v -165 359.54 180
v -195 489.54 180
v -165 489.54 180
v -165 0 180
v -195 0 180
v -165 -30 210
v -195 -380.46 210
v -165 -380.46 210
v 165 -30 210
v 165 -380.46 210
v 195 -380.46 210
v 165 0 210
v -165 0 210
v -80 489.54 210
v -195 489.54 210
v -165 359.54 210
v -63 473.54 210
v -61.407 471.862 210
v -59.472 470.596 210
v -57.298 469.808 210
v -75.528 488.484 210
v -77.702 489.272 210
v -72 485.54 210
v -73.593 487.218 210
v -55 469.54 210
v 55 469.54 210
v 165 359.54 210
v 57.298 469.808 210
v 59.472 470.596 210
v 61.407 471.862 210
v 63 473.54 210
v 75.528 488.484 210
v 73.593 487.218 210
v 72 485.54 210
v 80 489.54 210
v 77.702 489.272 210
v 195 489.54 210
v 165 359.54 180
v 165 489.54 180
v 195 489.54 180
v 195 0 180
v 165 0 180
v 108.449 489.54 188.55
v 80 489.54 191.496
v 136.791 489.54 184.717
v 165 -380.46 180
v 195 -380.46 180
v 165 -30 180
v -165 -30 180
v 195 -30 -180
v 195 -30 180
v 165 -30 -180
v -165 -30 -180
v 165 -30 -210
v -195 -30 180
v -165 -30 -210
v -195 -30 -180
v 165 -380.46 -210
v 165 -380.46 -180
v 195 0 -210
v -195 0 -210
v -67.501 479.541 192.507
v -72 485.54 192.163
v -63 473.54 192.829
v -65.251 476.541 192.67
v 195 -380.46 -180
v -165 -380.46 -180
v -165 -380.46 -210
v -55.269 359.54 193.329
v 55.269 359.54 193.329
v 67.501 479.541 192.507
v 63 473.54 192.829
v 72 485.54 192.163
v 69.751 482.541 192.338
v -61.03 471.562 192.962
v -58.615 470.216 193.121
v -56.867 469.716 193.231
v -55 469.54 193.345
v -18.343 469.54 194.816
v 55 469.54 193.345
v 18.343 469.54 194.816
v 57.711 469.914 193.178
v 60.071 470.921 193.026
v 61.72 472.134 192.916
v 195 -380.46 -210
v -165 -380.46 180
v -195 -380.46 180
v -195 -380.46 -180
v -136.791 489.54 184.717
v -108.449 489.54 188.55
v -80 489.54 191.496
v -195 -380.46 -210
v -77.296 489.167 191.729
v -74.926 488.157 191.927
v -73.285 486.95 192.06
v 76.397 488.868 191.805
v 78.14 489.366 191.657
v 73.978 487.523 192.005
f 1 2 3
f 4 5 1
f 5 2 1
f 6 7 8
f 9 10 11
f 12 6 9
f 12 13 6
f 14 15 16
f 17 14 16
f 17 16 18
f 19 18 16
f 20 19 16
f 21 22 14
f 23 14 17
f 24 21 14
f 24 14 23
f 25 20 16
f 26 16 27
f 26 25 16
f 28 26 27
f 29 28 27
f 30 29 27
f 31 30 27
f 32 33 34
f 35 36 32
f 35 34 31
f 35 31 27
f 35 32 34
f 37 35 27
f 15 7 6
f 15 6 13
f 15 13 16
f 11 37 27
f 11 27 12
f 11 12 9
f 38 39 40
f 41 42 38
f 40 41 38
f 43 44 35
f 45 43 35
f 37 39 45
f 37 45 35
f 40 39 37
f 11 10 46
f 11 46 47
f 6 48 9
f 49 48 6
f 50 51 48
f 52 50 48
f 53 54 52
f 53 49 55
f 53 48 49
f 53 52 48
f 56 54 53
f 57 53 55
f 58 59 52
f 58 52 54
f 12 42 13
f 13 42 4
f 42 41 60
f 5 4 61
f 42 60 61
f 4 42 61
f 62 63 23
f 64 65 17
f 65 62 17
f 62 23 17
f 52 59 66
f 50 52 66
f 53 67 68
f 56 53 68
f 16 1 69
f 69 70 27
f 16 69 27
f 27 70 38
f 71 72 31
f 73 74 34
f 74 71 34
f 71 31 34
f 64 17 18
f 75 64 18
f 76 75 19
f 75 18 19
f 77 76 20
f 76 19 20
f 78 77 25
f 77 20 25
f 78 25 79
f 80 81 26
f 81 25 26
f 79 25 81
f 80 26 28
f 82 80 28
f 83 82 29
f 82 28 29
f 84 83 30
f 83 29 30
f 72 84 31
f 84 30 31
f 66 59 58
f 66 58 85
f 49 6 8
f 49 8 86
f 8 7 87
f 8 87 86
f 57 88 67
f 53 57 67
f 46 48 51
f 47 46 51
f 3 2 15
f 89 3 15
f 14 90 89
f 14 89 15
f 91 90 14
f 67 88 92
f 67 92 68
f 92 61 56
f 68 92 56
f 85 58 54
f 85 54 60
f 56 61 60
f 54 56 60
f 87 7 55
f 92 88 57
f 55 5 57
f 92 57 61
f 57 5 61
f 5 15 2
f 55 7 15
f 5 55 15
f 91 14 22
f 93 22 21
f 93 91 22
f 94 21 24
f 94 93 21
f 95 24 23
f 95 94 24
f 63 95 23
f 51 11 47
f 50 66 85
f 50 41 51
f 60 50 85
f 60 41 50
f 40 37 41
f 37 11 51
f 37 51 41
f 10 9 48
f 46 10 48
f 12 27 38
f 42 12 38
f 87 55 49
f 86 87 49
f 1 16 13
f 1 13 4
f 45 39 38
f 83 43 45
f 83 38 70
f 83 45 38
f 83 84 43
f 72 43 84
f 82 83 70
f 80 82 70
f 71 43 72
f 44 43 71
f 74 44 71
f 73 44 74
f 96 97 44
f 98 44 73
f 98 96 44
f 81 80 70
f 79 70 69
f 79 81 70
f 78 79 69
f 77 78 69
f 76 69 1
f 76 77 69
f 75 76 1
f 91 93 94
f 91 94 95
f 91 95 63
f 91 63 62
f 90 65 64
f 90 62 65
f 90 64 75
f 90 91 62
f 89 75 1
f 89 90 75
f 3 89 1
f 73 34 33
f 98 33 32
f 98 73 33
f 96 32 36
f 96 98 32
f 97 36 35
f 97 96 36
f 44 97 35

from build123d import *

# Parameters (mm, degrees)
BOSS_EXTRUDE1_DEPTH        = 489.54
BOSS_EXTRUDE1_DEPTH_BACK   = 430
SKETCH2_W                  = 30
SKETCH2_H                  = 30
BOSS_EXTRUDE1_2_DEPTH      = 489.54
BOSS_EXTRUDE1_2_DEPTH_BACK = 430
SKETCH3_W                  = 30
SKETCH3_H                  = 30
BOSS_EXTRUDE2_DEPTH        = 430
BOSS_EXTRUDE2_2_DEPTH      = 430
BOSS_EXTRUDE3_DEPTH        = 30
BOSS_EXTRUDE4_DEPTH        = 130
CUT_EXTRUDE2_REACH         = 675.85
CUT_EXTRUDE2_END_RADIUS    = 915
FILLET1_R                  = 10
SKETCH8_W                  = 390
SKETCH8_H                  = 49.54
CUT_EXTRUDE3_DEPTH         = 674.850437188


with BuildPart() as part:
    # Sketch2 → Boss-Extrude1 (new, two sides: drawn at the far end of the back side and taken through both)
    with BuildSketch(Plane(origin=(0, 0, 0), x_dir=(1, 0, 0), z_dir=(0, 1, 0)).offset(-BOSS_EXTRUDE1_DEPTH_BACK)):
        with Locations((-180, -195)):
            Rectangle(SKETCH2_W, SKETCH2_H)
    extrude(amount=BOSS_EXTRUDE1_DEPTH + BOSS_EXTRUDE1_DEPTH_BACK)



with BuildPart() as body_2:
    # Sketch2 → Boss-Extrude1 2 (new, two sides: drawn at the far end of the back side and taken through both)
    with BuildSketch(Plane(origin=(0, 0, 0), x_dir=(1, 0, 0), z_dir=(0, 1, 0)).offset(-BOSS_EXTRUDE1_2_DEPTH_BACK)):
        with Locations((180, -195)):
            Rectangle(SKETCH2_W, SKETCH2_H)
    extrude(amount=BOSS_EXTRUDE1_2_DEPTH + BOSS_EXTRUDE1_2_DEPTH_BACK)


with BuildPart() as body_3:
    # Sketch3 → Boss-Extrude2 (new body)
    with BuildSketch(Plane(origin=(0, 0, 0), x_dir=(1, 0, 0), z_dir=(0, 1, 0))):
        with Locations((-180, 195)):
            Rectangle(SKETCH3_W, SKETCH3_H)
    extrude(amount=-BOSS_EXTRUDE2_DEPTH)


with BuildPart() as body_4:
    # Sketch3 → Boss-Extrude2 2 (new body)
    with BuildSketch(Plane(origin=(0, 0, 0), x_dir=(1, 0, 0), z_dir=(0, 1, 0))):
        with Locations((180, 195)):
            Rectangle(SKETCH3_W, SKETCH3_H)
    extrude(amount=-BOSS_EXTRUDE2_2_DEPTH)


with BuildPart() as part_1:
    add(part.part)

    add(body_2.part)  # Boss-Extrude3 merges body 2

    add(body_3.part)  # Boss-Extrude3 merges body 3

    add(body_4.part)  # Boss-Extrude3 merges body 4
    # Sketch4 → Boss-Extrude3 (add)
    with BuildSketch(Plane(origin=(0, 0, 0), x_dir=(1, 0, 0), z_dir=(0, 1, 0))):
        Polygon((-165, 210), (165, 210), (165, 180), (195, 180), (195, -180), (165, -180), (165, -210), (-165, -210), (-165, -180), (-195, -180), (-195, 180), (-165, 180), align=None)
    extrude(amount=-BOSS_EXTRUDE3_DEPTH)

    # Sketch5 → Boss-Extrude4 (add)
    with BuildSketch(Plane(origin=(0, 489.54, 0), x_dir=(1, 0, 0), z_dir=(0, 1, 0))):
        with BuildLine():
            Line((-165, -180), (-165, -210))
            Line((-165, -210), (165, -210))
            Line((165, -210), (165, -180))
            ThreePointArc((165, -180), (0, -195), (-165, -180))
        make_face()
    extrude(amount=-BOSS_EXTRUDE4_DEPTH)

    # Cut-Extrude2: up to this cylinder (the profile starts outside it)
    cut_extrude2_end = Plane(origin=(0, 479.936128, -720), z_dir=(0, 1, 0)) * Cylinder(CUT_EXTRUDE2_END_RADIUS, 3182.7, mode=Mode.PRIVATE)
    # Sketch7 → Cut-Extrude2 (cut, up to the surface)
    with BuildSketch(Plane.XY.offset(210), mode=Mode.PRIVATE) as cut_extrude2_sk1:
        with BuildLine():
            Line((75, 489.54), (-75, 489.54))
            Line((-75, 489.54), (-63, 473.54))
            ThreePointArc((-63, 473.54), (-59.472135955, 470.59572809), (-55, 469.54))
            Line((-55, 469.54), (55, 469.54))
            ThreePointArc((55, 469.54), (59.472135955, 470.59572809), (63, 473.54))
            Line((63, 473.54), (75, 489.54))
        make_face()
    cut_extrude2_tool1 = extrude(cut_extrude2_sk1.sketch, amount=-CUT_EXTRUDE2_REACH, mode=Mode.PRIVATE) - cut_extrude2_end
    add(cut_extrude2_tool1.solids().sort_by_distance((0, 479.936128, 210))[0], mode=Mode.SUBTRACT)

    # Fillet1
    fillet1_edges = [part_1.edges().sort_by_distance(p)[0] for p in [
        (75, 489.54, 200.960524607),
        (-75, 489.54, 200.960524607),
    ]]
    fillet(fillet1_edges, radius=FILLET1_R)

    # Sketch8 → Cut-Extrude3 (cut, through all)
    with BuildSketch(Plane.XY.offset(210)):
        with Locations((0, -405.23)):
            Rectangle(SKETCH8_W, SKETCH8_H)
    extrude(amount=-CUT_EXTRUDE3_DEPTH, mode=Mode.SUBTRACT)


solid = part_1.part
